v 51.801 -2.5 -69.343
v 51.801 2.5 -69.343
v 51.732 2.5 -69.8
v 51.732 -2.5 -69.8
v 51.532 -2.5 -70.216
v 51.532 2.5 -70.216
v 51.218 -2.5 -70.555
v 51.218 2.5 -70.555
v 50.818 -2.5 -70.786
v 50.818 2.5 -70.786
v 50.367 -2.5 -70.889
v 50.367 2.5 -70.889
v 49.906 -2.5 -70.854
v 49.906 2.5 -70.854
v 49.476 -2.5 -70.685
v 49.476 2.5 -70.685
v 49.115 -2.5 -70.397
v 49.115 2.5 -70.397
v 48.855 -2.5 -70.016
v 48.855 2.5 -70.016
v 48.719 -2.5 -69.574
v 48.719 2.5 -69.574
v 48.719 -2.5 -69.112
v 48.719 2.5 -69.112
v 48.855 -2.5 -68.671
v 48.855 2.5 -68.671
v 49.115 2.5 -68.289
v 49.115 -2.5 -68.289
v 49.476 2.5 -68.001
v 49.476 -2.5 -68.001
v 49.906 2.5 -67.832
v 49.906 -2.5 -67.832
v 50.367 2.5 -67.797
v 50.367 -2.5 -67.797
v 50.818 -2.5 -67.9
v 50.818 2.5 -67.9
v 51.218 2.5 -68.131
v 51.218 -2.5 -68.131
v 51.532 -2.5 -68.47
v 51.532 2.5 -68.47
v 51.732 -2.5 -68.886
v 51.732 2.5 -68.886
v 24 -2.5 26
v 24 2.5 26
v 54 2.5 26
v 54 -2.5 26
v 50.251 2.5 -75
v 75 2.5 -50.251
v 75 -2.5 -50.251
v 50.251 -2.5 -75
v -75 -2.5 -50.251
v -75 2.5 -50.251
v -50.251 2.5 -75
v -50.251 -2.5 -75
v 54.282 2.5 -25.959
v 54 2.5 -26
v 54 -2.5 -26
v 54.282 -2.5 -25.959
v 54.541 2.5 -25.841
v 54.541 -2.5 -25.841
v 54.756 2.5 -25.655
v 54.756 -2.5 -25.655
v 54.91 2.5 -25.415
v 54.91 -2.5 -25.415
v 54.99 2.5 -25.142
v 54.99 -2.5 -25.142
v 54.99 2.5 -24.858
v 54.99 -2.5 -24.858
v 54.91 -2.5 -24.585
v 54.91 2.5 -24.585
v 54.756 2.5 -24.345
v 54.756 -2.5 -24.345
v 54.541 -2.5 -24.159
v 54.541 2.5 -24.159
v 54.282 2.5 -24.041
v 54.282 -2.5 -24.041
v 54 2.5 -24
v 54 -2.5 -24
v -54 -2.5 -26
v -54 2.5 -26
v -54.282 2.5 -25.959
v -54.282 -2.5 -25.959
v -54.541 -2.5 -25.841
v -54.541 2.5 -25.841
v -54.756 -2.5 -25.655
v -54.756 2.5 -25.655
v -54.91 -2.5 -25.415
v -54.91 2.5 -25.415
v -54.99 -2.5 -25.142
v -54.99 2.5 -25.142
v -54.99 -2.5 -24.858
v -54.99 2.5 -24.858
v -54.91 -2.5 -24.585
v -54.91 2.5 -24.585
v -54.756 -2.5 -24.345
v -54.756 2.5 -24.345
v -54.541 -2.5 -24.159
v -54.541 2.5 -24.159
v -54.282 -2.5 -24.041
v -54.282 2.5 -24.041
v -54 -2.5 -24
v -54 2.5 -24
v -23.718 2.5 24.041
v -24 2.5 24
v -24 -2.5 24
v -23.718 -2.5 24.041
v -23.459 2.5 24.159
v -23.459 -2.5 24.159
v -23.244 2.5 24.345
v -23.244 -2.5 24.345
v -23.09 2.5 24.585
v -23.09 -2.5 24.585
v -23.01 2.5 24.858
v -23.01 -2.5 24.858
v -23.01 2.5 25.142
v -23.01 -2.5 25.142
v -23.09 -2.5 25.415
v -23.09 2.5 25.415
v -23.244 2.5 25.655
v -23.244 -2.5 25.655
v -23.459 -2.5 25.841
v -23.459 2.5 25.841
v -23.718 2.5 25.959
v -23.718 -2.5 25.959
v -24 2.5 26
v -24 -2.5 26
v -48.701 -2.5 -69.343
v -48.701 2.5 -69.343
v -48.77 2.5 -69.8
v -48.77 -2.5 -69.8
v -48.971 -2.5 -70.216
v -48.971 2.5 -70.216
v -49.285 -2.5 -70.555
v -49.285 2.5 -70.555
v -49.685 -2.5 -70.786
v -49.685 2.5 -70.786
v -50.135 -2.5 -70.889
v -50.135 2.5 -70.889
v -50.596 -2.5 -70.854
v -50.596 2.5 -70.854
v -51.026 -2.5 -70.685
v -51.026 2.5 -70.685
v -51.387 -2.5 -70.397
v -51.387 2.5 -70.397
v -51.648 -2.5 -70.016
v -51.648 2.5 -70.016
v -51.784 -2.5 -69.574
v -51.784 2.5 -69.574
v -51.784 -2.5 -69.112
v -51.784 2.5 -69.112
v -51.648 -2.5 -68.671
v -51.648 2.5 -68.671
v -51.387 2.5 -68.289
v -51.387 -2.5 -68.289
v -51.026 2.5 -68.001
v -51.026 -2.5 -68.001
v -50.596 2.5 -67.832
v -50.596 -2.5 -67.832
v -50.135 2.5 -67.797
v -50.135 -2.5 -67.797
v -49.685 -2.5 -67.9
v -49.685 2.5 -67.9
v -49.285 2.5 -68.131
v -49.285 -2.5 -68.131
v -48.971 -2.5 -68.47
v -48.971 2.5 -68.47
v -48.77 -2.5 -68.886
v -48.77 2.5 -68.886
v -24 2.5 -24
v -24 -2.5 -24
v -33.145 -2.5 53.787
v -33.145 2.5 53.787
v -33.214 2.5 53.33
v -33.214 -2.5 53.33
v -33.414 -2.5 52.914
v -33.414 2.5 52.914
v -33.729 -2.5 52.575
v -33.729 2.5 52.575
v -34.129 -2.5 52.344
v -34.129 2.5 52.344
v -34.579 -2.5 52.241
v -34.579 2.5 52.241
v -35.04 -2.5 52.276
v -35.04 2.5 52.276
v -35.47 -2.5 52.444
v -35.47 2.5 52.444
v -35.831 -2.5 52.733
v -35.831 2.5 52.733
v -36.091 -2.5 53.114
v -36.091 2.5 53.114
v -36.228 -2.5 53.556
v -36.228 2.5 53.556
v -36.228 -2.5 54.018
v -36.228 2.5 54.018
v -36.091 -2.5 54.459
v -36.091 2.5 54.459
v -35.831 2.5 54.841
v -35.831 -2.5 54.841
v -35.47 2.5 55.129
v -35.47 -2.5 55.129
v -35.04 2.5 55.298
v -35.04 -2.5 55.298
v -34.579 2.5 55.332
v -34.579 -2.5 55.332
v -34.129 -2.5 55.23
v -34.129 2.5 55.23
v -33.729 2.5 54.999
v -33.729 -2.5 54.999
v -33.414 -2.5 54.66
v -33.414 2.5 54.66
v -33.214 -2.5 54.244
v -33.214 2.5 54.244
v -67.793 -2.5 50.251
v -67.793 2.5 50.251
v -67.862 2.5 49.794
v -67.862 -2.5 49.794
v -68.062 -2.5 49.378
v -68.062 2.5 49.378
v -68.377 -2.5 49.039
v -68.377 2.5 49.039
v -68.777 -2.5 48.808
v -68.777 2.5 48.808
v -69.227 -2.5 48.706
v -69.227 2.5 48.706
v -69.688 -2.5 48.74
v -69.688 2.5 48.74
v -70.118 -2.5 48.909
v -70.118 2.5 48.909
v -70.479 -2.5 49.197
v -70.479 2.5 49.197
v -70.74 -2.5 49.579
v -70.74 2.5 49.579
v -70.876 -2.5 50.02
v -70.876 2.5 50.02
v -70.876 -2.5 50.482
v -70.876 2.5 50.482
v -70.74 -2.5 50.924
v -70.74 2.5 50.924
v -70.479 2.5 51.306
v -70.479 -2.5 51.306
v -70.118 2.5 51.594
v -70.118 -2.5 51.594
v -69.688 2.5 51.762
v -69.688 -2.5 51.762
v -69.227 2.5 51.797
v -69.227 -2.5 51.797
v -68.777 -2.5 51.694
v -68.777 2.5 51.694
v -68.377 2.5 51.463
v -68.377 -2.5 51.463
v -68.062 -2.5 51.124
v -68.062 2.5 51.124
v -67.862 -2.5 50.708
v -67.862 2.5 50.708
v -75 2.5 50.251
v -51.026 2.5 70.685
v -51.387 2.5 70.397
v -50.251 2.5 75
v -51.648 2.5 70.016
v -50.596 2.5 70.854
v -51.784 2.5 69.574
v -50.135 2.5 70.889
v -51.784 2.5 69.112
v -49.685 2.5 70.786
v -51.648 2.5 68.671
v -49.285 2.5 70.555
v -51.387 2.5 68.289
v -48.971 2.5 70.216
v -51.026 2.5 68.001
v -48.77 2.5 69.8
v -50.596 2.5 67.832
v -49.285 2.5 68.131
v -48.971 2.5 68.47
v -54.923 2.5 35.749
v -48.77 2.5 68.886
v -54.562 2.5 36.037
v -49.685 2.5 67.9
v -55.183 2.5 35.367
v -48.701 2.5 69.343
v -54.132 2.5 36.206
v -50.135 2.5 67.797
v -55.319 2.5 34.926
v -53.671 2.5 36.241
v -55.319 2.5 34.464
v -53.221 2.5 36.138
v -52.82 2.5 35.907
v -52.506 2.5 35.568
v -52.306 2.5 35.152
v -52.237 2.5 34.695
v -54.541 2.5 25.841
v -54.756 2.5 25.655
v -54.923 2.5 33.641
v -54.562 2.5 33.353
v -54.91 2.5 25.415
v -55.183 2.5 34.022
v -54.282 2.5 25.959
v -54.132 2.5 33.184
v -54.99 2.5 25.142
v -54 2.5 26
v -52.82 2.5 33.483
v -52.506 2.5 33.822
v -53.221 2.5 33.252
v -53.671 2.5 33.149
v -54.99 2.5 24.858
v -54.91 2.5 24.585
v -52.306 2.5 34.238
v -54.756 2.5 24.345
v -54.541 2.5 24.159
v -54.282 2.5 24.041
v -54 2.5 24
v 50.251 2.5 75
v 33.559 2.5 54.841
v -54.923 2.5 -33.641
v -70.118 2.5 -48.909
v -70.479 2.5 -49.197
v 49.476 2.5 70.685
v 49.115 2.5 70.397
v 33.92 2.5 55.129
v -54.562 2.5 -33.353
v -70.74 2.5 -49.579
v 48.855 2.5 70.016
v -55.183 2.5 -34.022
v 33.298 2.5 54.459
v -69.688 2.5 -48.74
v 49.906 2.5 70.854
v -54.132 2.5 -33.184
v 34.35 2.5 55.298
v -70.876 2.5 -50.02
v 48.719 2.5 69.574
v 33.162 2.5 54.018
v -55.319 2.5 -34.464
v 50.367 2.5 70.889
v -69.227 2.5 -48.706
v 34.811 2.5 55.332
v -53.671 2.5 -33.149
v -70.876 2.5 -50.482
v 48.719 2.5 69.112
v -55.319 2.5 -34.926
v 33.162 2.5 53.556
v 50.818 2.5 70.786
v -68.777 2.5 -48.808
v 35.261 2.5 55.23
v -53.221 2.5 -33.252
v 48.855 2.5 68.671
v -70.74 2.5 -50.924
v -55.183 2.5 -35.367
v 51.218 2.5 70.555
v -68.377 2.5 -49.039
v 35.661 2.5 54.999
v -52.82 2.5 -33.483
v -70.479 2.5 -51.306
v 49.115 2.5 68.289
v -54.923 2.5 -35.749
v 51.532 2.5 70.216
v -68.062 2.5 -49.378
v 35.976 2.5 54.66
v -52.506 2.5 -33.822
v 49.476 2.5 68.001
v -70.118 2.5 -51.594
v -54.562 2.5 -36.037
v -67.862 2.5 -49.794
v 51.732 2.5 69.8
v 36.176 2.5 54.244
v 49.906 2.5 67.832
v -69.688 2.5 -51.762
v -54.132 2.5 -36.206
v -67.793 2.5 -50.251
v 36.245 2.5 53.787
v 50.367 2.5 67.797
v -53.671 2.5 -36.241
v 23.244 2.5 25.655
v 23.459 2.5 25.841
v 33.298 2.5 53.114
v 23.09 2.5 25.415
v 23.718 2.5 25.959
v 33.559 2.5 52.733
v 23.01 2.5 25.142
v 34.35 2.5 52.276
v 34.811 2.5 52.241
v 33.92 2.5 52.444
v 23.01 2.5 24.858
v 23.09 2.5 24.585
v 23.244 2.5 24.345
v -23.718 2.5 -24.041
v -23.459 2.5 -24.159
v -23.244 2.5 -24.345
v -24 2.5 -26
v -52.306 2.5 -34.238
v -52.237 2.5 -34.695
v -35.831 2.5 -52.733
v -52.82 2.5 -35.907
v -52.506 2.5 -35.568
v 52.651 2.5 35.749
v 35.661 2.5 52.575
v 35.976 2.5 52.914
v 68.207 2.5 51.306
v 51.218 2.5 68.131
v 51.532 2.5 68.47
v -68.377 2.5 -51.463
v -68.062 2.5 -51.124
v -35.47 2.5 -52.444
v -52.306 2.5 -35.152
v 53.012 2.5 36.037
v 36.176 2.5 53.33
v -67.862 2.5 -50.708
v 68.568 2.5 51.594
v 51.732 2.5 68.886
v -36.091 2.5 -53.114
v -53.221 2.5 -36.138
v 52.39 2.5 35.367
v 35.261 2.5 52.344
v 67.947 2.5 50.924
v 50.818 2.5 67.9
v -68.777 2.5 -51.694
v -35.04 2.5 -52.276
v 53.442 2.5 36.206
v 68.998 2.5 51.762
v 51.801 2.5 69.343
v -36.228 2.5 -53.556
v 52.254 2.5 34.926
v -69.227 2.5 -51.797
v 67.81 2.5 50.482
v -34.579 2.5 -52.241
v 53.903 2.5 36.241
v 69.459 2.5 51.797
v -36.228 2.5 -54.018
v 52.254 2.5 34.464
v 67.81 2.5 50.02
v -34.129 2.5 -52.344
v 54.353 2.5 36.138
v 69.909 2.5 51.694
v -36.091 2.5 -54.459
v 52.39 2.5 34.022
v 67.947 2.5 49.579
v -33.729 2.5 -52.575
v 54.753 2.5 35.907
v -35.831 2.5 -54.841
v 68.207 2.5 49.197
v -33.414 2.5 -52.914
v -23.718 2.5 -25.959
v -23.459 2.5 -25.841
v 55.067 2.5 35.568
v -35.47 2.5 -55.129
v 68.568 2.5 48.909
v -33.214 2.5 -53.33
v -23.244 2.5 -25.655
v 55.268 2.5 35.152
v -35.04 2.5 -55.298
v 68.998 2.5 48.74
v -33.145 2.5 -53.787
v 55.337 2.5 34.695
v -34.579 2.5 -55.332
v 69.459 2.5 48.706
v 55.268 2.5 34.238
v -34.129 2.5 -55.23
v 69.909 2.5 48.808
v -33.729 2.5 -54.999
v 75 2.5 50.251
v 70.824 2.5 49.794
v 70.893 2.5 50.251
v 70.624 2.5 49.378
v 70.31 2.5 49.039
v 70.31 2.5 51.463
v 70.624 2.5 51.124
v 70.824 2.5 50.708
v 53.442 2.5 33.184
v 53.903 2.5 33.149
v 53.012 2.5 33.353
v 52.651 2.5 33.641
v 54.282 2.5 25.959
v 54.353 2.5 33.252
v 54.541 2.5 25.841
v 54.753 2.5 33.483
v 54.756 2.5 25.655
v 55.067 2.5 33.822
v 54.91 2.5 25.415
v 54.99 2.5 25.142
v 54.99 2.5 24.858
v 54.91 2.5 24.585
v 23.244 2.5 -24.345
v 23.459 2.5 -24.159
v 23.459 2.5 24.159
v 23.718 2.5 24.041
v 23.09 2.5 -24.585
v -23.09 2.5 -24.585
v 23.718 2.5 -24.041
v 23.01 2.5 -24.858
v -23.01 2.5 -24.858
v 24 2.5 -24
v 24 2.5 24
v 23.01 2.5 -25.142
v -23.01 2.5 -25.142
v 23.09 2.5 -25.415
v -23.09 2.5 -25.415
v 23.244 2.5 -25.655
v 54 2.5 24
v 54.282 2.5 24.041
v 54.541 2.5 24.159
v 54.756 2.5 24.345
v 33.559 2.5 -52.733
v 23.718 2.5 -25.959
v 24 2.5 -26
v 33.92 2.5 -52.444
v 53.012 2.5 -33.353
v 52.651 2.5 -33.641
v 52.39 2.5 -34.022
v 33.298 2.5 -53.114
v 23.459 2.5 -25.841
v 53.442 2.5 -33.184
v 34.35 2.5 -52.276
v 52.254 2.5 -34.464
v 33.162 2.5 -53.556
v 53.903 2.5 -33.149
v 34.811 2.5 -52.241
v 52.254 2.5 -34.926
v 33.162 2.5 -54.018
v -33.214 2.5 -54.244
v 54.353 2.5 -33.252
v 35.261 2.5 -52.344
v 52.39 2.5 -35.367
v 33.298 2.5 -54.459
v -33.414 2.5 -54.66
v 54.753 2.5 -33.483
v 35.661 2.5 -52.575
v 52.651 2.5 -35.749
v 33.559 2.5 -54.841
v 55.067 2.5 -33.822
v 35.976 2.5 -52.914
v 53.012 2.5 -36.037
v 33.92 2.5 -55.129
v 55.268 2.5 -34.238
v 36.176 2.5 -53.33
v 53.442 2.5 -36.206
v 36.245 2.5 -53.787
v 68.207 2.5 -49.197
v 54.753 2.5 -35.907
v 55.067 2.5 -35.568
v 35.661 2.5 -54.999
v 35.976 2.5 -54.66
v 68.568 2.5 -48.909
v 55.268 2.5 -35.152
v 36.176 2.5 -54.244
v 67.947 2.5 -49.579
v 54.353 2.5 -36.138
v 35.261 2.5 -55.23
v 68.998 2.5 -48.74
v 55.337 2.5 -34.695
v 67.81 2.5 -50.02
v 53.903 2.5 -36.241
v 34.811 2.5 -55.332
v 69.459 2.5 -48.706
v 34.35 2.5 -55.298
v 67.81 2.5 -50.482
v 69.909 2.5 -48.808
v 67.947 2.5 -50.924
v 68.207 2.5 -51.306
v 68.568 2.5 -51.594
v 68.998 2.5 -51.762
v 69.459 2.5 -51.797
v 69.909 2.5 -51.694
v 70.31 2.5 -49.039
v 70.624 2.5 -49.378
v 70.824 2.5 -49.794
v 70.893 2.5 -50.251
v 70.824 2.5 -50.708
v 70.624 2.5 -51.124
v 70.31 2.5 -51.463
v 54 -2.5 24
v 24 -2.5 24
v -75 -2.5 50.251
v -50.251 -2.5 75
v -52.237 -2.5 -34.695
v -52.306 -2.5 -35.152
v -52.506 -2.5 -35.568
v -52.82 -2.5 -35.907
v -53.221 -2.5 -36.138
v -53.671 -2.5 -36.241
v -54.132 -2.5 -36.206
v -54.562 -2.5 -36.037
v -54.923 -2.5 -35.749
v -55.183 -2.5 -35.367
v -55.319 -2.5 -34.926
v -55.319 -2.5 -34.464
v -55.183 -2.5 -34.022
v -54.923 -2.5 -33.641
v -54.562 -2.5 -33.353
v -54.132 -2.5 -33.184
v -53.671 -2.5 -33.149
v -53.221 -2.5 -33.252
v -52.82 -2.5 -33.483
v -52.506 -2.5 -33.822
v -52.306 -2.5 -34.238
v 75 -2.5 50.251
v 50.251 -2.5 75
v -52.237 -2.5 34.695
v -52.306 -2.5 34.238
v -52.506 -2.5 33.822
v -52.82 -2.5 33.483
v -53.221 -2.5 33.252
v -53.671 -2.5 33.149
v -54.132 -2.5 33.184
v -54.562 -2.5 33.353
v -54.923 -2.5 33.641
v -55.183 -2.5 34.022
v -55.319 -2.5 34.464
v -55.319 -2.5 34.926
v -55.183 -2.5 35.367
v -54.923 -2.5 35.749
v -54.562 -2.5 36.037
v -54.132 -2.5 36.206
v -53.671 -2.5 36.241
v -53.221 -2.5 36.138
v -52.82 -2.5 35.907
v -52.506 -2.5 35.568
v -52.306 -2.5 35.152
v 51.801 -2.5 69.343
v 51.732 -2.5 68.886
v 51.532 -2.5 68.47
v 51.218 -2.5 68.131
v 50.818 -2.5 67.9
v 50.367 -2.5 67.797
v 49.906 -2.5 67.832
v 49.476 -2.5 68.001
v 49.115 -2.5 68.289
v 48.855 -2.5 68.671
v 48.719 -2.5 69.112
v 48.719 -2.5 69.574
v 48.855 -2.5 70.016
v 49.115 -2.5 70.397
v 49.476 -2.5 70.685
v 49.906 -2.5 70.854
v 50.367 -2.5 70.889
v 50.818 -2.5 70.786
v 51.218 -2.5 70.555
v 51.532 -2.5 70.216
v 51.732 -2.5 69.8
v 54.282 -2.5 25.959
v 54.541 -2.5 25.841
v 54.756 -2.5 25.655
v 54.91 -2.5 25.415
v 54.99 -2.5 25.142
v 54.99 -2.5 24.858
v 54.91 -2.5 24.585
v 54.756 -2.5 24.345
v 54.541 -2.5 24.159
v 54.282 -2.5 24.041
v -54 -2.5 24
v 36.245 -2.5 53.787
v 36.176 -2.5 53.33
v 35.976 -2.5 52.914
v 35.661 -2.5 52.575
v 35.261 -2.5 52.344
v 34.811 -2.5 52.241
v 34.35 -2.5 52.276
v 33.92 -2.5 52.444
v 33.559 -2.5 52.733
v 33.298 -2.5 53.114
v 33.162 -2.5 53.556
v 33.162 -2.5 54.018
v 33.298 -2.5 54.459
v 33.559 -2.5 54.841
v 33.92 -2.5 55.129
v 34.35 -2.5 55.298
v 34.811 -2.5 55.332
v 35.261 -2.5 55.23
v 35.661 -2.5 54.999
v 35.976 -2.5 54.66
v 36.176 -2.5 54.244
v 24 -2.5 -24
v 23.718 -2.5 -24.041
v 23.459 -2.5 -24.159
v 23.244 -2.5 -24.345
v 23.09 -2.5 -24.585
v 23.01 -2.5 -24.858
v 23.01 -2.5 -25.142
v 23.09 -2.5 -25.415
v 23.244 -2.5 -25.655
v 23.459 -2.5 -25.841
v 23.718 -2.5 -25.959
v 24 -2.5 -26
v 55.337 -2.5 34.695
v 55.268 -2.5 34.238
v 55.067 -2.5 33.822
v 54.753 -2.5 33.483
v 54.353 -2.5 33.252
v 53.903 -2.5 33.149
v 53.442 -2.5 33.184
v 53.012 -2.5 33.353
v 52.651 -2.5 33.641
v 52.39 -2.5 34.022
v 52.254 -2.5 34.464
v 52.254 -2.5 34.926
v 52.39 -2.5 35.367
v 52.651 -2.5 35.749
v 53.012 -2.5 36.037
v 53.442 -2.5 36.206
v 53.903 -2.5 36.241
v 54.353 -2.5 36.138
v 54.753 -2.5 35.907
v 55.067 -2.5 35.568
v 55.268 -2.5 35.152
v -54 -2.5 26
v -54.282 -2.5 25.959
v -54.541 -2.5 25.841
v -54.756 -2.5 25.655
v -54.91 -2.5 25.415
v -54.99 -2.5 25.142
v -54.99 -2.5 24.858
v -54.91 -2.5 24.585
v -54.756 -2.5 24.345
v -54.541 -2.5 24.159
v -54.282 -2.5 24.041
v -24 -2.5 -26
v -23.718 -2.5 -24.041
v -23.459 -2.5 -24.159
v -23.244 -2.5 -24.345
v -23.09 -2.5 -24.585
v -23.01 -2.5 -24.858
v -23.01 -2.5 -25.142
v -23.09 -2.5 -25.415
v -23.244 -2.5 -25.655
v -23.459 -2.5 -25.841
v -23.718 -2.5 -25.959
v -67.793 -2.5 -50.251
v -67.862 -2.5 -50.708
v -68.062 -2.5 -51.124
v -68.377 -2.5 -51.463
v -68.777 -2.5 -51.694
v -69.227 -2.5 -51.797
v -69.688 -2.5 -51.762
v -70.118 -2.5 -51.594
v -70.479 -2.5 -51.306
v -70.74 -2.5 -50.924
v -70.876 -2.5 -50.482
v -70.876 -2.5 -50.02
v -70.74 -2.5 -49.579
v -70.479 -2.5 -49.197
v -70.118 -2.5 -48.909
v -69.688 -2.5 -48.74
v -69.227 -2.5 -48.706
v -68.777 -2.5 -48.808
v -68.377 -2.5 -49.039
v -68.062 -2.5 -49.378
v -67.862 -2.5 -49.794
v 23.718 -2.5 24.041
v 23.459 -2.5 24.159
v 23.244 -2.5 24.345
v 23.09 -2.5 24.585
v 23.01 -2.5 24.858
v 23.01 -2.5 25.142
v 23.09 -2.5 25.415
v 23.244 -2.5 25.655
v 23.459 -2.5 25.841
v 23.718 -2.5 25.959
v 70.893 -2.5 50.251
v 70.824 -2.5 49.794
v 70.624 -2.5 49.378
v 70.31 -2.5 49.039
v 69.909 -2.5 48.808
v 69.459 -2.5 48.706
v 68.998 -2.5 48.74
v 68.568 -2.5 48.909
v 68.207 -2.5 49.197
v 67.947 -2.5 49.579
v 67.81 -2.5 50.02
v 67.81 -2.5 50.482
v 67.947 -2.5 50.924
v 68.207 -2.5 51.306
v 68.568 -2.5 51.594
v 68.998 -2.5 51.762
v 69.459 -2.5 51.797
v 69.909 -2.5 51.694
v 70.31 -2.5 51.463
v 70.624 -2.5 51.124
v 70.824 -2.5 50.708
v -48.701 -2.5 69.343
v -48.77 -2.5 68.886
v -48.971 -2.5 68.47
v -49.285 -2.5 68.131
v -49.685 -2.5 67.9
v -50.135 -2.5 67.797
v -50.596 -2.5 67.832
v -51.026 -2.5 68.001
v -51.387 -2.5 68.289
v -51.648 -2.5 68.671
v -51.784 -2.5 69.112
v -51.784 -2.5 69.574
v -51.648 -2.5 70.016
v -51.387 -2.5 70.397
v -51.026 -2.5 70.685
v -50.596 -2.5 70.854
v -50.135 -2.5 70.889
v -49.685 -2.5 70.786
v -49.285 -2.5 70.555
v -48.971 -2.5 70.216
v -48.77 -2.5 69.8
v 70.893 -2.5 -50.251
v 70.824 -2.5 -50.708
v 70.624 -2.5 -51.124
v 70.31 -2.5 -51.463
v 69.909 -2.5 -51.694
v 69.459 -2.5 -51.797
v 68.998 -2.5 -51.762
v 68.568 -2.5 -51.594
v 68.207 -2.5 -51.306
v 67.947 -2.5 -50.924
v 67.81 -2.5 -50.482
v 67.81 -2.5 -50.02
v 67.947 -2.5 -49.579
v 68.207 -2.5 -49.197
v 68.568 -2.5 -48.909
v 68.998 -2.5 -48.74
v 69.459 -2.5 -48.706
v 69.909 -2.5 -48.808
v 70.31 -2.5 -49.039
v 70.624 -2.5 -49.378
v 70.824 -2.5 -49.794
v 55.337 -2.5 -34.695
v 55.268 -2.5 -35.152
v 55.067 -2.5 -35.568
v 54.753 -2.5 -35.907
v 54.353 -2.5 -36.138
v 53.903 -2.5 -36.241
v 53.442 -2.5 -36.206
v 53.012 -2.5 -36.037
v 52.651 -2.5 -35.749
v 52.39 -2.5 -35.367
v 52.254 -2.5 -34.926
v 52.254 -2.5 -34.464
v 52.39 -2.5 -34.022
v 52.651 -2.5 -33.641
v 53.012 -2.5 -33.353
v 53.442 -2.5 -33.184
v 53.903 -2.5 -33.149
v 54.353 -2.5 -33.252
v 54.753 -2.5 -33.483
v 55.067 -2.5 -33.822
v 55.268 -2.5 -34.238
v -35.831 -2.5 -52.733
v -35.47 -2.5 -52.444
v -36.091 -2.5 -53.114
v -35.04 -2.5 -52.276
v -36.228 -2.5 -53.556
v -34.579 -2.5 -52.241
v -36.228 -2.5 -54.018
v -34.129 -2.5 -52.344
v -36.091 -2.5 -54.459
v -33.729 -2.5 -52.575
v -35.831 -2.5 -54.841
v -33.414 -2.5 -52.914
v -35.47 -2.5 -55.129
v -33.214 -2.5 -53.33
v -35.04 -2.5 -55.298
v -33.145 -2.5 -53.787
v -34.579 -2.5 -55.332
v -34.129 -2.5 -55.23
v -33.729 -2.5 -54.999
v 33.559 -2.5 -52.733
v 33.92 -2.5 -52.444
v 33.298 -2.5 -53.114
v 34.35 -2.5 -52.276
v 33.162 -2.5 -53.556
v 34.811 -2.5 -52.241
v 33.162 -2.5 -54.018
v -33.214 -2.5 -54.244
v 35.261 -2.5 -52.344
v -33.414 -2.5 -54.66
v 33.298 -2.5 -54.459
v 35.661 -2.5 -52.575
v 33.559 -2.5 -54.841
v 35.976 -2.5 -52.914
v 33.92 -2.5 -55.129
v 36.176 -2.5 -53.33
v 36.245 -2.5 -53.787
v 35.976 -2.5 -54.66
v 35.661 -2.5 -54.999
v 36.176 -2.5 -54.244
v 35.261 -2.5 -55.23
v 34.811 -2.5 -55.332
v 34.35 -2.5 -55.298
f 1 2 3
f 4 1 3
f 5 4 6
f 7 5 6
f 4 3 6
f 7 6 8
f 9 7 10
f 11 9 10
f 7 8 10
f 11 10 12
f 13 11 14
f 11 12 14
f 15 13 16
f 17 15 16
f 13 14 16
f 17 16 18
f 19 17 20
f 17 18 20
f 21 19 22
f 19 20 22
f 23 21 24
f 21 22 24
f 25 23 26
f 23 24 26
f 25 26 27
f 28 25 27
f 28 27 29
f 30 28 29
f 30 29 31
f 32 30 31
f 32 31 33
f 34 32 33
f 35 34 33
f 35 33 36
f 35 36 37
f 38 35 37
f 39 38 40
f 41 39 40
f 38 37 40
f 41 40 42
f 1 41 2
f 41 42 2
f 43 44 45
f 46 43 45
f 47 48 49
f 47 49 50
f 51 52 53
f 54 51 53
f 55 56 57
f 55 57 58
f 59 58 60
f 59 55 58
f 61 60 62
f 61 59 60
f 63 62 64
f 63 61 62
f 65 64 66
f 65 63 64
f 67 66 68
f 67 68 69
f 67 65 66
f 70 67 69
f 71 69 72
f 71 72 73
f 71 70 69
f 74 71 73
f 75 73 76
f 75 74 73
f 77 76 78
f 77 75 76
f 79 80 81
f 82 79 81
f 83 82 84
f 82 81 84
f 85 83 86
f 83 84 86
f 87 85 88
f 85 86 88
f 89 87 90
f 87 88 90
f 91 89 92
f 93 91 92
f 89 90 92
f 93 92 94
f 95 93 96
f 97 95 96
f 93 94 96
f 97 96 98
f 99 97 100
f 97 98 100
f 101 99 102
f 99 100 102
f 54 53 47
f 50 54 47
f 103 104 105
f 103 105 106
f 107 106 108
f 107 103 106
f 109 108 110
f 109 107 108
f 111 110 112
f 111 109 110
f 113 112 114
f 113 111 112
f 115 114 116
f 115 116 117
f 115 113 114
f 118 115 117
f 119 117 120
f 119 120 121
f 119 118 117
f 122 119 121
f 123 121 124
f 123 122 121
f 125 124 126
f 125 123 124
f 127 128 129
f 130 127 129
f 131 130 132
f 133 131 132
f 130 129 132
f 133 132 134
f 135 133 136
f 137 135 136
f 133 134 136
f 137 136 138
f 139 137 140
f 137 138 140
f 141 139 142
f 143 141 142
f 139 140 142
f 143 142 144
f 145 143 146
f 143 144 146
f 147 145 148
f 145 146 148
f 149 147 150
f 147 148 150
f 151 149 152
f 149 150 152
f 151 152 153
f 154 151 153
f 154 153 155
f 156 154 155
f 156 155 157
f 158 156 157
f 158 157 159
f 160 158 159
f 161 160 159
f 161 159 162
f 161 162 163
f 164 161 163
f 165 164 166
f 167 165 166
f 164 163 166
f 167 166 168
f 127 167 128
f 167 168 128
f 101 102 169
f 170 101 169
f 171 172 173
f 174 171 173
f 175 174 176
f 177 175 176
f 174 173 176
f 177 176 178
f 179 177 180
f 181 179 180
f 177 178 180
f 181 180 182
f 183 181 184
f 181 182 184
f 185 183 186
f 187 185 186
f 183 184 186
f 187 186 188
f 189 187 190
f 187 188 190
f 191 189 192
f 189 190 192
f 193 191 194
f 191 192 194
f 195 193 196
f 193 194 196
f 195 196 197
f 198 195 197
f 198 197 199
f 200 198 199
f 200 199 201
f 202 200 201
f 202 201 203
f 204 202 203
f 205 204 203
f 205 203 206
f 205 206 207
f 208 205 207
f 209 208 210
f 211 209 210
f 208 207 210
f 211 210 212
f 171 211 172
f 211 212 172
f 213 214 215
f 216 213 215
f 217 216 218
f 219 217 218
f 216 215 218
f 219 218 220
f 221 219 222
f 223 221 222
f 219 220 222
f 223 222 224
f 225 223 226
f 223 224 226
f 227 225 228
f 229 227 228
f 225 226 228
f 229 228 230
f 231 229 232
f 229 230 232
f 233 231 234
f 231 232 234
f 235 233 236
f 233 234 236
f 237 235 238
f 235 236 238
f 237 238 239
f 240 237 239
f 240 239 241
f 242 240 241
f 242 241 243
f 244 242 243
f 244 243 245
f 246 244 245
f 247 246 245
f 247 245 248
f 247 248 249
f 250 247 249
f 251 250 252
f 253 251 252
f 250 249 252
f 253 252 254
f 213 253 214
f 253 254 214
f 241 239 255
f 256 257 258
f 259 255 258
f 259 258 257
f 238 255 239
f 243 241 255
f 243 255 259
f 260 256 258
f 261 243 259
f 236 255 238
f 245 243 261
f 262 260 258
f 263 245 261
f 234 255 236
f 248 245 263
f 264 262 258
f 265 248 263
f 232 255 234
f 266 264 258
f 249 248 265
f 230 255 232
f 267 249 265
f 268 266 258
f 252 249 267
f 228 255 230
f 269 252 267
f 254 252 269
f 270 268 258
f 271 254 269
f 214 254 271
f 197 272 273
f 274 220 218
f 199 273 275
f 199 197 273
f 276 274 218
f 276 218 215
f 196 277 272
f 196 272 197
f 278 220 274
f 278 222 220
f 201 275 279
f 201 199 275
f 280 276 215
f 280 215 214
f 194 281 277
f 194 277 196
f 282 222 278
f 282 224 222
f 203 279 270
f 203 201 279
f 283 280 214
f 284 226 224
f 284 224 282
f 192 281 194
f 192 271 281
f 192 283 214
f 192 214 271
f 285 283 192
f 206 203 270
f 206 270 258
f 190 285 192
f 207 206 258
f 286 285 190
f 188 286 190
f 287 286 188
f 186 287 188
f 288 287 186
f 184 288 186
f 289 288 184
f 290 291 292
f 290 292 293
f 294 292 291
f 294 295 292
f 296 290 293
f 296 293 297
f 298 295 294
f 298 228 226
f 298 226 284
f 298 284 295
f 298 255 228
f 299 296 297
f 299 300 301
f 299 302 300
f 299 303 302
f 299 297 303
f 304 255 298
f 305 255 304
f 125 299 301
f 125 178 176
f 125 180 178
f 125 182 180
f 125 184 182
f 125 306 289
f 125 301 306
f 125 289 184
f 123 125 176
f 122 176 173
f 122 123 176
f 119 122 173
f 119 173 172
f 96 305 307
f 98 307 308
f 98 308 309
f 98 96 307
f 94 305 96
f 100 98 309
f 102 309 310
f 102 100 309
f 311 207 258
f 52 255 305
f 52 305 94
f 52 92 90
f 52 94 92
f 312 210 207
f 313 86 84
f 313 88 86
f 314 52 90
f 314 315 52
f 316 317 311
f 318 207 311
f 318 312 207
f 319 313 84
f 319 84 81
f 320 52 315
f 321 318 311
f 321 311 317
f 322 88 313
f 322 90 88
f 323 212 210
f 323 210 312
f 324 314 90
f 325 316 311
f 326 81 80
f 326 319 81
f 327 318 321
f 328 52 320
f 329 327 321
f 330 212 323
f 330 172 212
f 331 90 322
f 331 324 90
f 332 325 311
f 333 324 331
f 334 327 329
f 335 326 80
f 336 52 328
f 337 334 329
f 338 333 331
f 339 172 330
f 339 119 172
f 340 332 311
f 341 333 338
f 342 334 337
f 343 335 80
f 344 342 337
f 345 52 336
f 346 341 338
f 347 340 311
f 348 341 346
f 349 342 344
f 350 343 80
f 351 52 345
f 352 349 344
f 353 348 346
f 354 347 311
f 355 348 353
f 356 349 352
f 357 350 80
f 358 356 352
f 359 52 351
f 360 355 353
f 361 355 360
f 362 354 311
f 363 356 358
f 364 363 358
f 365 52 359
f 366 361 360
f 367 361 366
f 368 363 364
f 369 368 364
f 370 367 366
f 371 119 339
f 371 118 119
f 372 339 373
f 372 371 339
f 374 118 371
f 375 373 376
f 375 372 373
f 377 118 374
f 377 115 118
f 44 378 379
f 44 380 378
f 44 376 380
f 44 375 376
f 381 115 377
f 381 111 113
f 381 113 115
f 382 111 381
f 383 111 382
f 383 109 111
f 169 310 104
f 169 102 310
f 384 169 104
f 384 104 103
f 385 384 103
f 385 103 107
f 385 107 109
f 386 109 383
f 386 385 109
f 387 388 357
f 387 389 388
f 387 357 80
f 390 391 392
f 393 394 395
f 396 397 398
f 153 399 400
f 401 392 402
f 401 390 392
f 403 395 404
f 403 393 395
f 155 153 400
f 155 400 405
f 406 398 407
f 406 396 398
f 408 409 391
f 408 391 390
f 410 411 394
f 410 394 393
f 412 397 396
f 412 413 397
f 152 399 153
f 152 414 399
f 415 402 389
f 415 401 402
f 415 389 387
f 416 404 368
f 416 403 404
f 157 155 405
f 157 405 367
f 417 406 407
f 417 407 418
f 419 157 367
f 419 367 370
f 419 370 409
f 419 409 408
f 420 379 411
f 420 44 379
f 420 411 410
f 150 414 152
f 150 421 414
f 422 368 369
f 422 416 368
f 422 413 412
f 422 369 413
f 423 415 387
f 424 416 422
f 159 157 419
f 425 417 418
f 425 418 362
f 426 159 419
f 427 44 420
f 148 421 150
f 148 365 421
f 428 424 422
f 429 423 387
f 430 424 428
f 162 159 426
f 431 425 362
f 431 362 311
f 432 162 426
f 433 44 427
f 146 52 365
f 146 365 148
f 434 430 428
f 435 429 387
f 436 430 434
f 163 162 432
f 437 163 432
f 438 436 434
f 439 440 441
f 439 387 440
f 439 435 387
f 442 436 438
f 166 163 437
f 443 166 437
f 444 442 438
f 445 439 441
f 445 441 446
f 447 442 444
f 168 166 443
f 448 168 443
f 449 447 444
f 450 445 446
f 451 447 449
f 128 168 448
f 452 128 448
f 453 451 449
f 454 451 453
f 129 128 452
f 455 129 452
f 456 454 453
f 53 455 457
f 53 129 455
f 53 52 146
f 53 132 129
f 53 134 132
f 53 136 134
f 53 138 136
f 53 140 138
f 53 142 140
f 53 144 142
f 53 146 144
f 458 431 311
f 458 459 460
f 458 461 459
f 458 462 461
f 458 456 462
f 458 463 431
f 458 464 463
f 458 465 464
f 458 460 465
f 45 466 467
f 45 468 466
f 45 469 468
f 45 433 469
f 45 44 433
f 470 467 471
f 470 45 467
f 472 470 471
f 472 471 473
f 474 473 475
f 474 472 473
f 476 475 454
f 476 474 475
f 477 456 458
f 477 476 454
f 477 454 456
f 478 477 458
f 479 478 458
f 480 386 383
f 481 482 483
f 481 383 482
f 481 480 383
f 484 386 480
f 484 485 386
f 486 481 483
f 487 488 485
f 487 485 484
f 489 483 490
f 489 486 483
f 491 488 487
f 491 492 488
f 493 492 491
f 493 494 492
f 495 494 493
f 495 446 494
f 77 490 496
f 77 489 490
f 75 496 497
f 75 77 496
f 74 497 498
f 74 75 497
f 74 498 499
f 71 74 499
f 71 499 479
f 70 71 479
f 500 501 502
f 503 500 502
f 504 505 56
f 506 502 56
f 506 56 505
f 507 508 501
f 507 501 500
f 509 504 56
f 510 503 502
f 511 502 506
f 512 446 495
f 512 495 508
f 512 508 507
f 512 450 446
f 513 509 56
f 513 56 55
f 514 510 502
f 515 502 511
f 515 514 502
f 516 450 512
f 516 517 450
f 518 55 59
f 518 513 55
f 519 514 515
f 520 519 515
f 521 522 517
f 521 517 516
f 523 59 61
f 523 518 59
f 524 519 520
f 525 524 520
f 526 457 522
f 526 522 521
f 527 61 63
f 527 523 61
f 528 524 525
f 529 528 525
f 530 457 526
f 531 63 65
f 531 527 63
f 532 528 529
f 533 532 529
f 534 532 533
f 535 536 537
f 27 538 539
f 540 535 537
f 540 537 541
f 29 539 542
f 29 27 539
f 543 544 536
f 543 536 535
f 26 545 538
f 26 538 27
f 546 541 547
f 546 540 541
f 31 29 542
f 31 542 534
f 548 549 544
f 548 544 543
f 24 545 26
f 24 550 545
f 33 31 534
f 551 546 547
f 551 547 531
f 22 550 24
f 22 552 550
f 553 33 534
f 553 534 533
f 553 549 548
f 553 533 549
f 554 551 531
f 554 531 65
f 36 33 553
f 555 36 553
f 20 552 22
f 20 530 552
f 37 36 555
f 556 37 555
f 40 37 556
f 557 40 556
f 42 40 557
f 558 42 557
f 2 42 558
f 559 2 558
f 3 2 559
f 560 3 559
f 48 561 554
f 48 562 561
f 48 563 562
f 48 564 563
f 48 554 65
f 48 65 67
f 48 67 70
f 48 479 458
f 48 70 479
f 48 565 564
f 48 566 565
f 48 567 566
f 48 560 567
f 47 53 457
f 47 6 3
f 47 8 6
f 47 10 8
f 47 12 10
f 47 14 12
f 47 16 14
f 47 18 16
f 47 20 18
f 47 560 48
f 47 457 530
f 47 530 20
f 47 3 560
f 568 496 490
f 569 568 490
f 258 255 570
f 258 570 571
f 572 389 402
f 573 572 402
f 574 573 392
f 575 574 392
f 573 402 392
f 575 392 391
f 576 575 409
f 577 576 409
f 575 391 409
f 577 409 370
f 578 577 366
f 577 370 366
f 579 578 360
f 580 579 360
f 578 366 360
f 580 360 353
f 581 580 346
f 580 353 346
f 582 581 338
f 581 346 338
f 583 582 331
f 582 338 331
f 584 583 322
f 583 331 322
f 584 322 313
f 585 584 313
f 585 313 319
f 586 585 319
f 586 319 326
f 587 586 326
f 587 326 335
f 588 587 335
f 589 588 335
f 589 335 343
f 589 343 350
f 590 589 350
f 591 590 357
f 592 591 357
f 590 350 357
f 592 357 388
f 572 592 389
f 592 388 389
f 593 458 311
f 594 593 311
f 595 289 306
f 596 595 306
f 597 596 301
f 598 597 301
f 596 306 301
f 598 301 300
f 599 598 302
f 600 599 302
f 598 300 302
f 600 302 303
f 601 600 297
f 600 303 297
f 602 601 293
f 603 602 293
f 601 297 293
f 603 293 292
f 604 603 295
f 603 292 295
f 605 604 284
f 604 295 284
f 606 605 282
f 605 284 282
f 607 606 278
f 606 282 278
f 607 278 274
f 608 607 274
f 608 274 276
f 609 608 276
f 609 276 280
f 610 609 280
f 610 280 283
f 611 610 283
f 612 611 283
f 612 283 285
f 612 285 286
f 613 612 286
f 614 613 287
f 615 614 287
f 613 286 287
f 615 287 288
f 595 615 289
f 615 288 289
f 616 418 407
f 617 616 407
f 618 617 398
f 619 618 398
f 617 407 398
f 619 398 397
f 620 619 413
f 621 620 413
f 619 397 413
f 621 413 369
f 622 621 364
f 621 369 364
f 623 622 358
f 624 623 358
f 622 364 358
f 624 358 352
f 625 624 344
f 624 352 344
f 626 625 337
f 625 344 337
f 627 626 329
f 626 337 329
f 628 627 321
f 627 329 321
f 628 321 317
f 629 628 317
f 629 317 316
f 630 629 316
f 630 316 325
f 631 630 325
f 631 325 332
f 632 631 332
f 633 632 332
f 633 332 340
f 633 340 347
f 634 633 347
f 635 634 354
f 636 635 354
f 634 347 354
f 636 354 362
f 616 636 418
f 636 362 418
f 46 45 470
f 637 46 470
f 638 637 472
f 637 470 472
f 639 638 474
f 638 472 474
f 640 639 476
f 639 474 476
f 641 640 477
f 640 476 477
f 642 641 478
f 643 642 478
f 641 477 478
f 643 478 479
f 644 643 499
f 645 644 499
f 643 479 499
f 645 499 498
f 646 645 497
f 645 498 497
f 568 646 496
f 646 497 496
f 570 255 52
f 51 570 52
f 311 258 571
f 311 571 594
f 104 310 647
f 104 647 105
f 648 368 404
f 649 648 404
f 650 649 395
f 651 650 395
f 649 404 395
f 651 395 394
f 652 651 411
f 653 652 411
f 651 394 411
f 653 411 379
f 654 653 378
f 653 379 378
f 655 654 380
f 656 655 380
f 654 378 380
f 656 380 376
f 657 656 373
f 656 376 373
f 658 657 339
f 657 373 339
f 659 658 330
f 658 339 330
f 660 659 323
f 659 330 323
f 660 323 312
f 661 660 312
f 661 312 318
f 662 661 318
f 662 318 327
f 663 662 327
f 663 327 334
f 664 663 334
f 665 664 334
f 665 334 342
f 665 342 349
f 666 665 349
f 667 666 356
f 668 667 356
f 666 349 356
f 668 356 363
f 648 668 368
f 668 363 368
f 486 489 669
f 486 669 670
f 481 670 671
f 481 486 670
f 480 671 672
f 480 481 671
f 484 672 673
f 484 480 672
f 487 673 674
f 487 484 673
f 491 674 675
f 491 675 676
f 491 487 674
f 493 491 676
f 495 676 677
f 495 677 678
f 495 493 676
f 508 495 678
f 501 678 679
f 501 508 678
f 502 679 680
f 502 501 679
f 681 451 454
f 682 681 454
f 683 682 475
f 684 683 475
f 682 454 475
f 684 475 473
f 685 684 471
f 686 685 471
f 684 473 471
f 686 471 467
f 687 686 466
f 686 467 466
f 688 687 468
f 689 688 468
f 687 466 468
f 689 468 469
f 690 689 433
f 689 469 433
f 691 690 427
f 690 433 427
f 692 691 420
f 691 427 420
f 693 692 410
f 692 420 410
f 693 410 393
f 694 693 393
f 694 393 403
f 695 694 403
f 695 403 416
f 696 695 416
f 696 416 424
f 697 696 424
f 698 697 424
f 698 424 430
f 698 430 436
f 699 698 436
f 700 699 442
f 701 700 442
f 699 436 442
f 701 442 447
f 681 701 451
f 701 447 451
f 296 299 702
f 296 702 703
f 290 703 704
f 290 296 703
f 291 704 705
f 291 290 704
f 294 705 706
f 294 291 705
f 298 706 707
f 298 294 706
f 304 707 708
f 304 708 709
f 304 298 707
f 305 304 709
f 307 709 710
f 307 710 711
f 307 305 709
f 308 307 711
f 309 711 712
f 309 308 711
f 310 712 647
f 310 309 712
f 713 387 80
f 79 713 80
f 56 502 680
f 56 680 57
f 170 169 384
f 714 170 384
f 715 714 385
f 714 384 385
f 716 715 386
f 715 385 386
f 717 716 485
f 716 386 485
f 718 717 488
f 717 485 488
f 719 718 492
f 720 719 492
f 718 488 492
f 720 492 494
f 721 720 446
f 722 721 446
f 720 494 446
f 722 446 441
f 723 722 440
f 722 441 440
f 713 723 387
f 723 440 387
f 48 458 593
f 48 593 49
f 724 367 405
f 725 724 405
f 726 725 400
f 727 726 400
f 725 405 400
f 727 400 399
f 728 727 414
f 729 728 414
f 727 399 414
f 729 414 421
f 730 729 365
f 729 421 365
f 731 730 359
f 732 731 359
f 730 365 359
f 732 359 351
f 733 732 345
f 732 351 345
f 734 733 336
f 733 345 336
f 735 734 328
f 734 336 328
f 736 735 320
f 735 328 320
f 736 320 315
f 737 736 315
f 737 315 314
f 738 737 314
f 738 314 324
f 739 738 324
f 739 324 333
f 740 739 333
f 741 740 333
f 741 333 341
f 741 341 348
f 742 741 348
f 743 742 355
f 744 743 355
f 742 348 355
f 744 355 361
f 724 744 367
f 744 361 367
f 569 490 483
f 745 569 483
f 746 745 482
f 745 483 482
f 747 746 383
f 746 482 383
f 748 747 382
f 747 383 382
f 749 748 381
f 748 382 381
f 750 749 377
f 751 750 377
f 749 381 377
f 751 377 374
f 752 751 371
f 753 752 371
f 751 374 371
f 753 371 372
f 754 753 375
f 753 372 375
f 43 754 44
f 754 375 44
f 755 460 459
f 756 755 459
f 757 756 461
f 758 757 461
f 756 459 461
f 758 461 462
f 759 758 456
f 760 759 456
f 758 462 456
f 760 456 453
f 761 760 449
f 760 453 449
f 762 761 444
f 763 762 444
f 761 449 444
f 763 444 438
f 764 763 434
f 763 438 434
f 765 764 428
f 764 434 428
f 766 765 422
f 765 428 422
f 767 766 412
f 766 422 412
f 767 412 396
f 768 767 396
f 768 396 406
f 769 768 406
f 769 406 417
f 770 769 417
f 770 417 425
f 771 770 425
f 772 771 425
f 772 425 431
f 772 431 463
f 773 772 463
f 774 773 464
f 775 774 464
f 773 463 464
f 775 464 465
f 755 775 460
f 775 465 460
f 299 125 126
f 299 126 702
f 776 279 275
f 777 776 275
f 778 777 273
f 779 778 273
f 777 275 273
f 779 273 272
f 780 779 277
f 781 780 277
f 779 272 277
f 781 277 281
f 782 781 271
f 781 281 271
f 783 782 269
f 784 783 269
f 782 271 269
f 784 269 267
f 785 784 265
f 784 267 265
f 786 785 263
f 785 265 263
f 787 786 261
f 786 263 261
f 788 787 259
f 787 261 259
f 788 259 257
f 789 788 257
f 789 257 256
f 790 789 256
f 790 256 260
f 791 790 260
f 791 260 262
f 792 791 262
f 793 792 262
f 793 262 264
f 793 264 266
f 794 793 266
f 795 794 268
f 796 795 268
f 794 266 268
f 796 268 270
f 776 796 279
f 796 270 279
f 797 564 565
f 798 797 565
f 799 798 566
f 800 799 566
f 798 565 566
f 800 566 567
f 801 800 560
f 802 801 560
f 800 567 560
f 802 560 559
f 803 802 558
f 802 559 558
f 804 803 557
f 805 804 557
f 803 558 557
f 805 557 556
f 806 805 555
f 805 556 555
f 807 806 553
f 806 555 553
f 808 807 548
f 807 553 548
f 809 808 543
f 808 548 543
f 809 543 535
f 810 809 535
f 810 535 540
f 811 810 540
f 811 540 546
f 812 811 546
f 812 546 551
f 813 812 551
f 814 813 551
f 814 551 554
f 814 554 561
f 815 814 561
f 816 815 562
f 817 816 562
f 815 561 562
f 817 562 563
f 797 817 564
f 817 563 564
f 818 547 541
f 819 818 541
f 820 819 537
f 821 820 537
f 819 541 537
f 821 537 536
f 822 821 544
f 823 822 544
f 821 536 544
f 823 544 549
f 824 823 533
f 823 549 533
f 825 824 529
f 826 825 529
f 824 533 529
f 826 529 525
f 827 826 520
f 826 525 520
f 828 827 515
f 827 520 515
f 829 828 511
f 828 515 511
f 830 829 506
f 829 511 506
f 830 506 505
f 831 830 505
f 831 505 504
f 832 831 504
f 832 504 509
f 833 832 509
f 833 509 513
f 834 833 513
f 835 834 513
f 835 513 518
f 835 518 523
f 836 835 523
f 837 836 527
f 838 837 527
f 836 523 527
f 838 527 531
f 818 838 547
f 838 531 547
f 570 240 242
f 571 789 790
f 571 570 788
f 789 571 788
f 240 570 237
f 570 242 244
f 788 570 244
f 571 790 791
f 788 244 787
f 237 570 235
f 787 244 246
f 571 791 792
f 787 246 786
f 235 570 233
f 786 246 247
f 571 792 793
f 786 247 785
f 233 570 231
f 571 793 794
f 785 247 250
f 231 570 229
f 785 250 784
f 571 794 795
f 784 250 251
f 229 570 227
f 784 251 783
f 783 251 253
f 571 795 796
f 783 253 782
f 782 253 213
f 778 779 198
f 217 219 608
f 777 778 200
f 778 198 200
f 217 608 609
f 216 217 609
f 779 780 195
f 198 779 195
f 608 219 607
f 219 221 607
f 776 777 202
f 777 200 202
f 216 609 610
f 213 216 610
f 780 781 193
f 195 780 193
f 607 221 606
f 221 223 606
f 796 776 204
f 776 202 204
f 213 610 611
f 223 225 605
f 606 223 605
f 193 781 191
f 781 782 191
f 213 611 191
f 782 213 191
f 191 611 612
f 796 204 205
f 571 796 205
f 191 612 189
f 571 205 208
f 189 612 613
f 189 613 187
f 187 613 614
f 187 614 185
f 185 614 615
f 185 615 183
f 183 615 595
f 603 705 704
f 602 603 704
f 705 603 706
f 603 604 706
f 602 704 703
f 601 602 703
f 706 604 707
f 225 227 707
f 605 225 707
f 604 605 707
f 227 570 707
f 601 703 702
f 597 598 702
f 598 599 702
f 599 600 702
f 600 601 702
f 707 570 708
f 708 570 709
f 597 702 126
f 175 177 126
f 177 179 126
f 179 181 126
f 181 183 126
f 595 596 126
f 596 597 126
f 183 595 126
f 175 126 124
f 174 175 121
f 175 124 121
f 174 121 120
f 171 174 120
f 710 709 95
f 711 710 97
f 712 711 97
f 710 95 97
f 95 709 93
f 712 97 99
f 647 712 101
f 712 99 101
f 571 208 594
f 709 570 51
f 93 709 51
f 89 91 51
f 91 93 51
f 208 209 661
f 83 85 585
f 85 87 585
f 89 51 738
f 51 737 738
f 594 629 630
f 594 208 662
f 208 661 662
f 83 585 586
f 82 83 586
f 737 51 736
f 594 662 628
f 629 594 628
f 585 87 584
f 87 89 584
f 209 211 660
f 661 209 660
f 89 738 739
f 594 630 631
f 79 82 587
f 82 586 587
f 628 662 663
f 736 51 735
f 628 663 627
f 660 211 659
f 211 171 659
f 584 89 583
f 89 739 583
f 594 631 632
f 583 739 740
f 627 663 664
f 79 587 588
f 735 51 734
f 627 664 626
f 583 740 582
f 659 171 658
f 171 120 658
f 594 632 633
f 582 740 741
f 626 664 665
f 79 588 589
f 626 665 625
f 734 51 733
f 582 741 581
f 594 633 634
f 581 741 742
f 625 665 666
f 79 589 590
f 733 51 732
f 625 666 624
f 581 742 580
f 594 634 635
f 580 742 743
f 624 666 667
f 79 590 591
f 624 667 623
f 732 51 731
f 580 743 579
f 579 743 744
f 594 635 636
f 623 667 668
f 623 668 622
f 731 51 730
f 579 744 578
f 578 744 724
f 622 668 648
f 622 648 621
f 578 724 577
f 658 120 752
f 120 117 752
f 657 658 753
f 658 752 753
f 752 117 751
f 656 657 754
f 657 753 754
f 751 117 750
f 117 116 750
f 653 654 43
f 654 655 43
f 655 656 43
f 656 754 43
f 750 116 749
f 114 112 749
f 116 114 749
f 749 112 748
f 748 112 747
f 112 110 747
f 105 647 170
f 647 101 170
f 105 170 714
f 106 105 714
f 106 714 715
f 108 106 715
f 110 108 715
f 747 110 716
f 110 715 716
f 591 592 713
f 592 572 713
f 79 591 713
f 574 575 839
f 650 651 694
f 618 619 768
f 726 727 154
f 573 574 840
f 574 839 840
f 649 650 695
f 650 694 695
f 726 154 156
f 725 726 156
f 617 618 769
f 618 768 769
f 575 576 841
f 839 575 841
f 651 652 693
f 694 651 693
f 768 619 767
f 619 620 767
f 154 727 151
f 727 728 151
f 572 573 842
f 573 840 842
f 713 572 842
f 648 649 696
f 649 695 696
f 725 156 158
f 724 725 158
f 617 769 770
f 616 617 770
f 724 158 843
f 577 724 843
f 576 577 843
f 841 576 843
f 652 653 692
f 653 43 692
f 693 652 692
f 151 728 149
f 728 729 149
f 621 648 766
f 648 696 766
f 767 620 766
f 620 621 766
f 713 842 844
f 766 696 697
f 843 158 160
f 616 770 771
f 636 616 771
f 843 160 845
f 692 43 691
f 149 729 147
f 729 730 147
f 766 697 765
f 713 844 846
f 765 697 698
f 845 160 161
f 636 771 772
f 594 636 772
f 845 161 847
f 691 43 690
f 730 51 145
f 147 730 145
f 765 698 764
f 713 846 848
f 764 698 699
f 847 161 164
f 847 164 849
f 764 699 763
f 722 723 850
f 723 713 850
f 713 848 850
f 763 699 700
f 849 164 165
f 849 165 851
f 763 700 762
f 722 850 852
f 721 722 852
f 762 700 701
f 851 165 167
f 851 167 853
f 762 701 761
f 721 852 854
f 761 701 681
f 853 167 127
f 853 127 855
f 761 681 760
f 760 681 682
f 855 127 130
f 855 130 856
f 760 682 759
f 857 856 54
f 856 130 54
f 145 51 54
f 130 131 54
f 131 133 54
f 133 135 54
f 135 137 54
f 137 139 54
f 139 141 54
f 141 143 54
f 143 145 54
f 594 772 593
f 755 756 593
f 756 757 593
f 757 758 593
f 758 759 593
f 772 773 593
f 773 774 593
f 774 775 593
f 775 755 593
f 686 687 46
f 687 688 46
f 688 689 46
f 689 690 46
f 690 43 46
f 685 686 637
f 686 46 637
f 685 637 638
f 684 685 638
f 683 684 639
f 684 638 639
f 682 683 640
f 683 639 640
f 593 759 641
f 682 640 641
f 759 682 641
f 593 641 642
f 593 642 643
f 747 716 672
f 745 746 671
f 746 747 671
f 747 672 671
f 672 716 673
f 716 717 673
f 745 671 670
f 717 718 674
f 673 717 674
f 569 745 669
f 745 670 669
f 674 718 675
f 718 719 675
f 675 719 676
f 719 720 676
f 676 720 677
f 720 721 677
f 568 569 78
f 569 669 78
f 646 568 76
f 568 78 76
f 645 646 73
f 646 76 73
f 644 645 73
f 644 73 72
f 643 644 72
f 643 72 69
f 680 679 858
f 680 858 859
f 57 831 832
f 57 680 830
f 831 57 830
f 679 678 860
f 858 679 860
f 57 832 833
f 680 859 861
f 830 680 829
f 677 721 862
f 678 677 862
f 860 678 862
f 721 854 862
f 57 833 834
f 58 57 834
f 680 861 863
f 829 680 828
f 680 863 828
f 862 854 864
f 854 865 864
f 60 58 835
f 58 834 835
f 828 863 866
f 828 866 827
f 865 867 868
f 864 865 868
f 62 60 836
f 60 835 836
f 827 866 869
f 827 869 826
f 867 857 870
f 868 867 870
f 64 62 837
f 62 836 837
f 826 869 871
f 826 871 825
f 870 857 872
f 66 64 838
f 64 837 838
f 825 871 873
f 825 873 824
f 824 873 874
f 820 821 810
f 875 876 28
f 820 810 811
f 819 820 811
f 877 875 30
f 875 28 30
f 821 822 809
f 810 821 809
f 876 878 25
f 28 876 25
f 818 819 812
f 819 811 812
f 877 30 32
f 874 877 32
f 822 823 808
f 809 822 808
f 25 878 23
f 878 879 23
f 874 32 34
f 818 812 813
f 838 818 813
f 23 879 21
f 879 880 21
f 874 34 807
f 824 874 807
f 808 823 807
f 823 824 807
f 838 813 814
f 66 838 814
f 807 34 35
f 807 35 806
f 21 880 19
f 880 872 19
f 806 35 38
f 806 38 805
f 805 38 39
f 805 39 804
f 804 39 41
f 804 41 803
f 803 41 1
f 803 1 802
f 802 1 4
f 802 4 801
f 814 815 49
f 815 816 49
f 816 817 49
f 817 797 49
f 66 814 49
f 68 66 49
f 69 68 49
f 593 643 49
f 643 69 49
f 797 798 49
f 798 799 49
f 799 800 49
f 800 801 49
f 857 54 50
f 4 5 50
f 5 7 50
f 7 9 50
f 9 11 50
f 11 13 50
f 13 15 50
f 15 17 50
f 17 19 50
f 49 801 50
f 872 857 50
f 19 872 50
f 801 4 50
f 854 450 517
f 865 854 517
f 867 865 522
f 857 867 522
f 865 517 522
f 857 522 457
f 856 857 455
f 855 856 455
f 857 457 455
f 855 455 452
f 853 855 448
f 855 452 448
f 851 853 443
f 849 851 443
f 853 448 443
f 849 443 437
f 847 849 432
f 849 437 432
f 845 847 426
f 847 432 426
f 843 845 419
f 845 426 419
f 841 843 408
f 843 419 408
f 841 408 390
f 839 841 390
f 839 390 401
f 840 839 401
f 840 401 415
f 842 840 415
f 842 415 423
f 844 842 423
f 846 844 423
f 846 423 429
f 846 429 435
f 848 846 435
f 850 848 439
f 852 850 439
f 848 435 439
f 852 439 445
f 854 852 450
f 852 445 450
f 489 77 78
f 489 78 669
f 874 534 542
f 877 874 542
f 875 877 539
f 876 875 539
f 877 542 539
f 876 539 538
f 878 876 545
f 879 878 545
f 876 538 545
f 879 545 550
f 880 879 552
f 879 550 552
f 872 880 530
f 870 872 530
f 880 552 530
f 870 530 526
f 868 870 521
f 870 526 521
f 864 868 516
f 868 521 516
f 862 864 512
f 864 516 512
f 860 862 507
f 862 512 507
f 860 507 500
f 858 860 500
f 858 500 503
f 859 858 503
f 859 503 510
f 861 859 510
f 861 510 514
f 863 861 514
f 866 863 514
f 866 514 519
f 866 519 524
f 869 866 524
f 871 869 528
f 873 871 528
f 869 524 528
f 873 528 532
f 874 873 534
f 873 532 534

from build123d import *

# Parameters (mm, degrees)
SKETCH1_W           = 150
SKETCH1_H           = 150
BOSS_EXTRUDE1_DEPTH = 2.5
CUT_EXTRUDE1_DEPTH  = 5
SKETCH3_R           = 1.55
CUT_EXTRUDE2_DEPTH  = 5
CUT_EXTRUDE3_DEPTH  = 5


with BuildPart() as part:
    # Sketch1 → Boss-Extrude1 (new body, symmetric)
    with BuildSketch(Plane(origin=(0, 0, 0), x_dir=(1, 0, 0), z_dir=(0, 1, 0))):
        Rectangle(SKETCH1_W, SKETCH1_H)
    extrude(amount=BOSS_EXTRUDE1_DEPTH, both=True)

    # Sketch2 → Cut-Extrude1 (cut)
    with BuildSketch(Plane(origin=(0, 2.5, 0), x_dir=(1, 0, 0), z_dir=(0, 1, 0))):
        Polygon((50.251262658, 75), (75, 75), (75, 50.251262658), align=None)
        Polygon((-75, 75), (-75, 50.251262658), (-50.251262658, 75), align=None)
        Polygon((-50.251262658, -75), (-75, -75), (-75, -50.251262658), align=None)
        Polygon((75, -75), (75, -50.251262658), (50.251262658, -75), align=None)
    extrude(amount=-CUT_EXTRUDE1_DEPTH, mode=Mode.SUBTRACT)

    # Sketch3 → Cut-Extrude2 (cut)
    with BuildSketch(Plane(origin=(0, 2.5, 0), x_dir=(1, 0, 0), z_dir=(0, 1, 0))):
        with Locations((69.343145751, 50.251262658)):
            Circle(SKETCH3_R)
        with Locations((53.786796564, 34.694913472)):
            Circle(SKETCH3_R)
        with Locations((34.694913472, 53.786796564)):
            Circle(SKETCH3_R)
        with Locations((50.251262658, 69.343145751)):
            Circle(SKETCH3_R)
        with Locations((-69.343145751, 50.251262658)):
            Circle(SKETCH3_R)
        with Locations((-53.786796564, 34.694913472)):
            Circle(SKETCH3_R)
        with Locations((-34.694913472, 53.786796564)):
            Circle(SKETCH3_R)
        with Locations((-50.251262658, 69.343145751)):
            Circle(SKETCH3_R)
        with Locations((-53.786796564, -34.694913472)):
            Circle(SKETCH3_R)
        with Locations((-69.343145751, -50.251262658)):
            Circle(SKETCH3_R)
        with Locations((-34.694913472, -53.786796564)):
            Circle(SKETCH3_R)
        with Locations((-50.251262658, -69.343145751)):
            Circle(SKETCH3_R)
        with Locations((69.343145751, -50.251262658)):
            Circle(SKETCH3_R)
        with Locations((53.786796564, -34.694913472)):
            Circle(SKETCH3_R)
        with Locations((34.694913472, -53.786796564)):
            Circle(SKETCH3_R)
        with Locations((50.251262658, -69.343145751)):
            Circle(SKETCH3_R)
    extrude(amount=-CUT_EXTRUDE2_DEPTH, mode=Mode.SUBTRACT)

    # Sketch4 → Cut-Extrude3 (cut)
    with BuildSketch(Plane(origin=(0, 2.5, 0), x_dir=(1, 0, 0), z_dir=(0, 1, 0))):
        with BuildLine():
            Line((24, 26), (54, 26))
            ThreePointArc((54, 26), (55, 25), (54, 24))
            Line((54, 24), (24, 24))
            ThreePointArc((24, 24), (23, 25), (24, 26))
        make_face()
        with BuildLine():
            Line((24, -26), (54, -26))
            ThreePointArc((54, -26), (55, -25), (54, -24))
            Line((54, -24), (24, -24))
            ThreePointArc((24, -24), (23, -25), (24, -26))
        make_face()
        with BuildLine():
            Line((-24, -26), (-54, -26))
            ThreePointArc((-54, -26), (-55, -25), (-54, -24))
            Line((-54, -24), (-24, -24))
            ThreePointArc((-24, -24), (-23, -25), (-24, -26))
        make_face()
        with BuildLine():
            Line((-24, 26), (-54, 26))
            ThreePointArc((-54, 26), (-55, 25), (-54, 24))
            Line((-54, 24), (-24, 24))
            ThreePointArc((-24, 24), (-23, 25), (-24, 26))
        make_face()
    extrude(amount=-CUT_EXTRUDE3_DEPTH, mode=Mode.SUBTRACT)


solid = part.part
